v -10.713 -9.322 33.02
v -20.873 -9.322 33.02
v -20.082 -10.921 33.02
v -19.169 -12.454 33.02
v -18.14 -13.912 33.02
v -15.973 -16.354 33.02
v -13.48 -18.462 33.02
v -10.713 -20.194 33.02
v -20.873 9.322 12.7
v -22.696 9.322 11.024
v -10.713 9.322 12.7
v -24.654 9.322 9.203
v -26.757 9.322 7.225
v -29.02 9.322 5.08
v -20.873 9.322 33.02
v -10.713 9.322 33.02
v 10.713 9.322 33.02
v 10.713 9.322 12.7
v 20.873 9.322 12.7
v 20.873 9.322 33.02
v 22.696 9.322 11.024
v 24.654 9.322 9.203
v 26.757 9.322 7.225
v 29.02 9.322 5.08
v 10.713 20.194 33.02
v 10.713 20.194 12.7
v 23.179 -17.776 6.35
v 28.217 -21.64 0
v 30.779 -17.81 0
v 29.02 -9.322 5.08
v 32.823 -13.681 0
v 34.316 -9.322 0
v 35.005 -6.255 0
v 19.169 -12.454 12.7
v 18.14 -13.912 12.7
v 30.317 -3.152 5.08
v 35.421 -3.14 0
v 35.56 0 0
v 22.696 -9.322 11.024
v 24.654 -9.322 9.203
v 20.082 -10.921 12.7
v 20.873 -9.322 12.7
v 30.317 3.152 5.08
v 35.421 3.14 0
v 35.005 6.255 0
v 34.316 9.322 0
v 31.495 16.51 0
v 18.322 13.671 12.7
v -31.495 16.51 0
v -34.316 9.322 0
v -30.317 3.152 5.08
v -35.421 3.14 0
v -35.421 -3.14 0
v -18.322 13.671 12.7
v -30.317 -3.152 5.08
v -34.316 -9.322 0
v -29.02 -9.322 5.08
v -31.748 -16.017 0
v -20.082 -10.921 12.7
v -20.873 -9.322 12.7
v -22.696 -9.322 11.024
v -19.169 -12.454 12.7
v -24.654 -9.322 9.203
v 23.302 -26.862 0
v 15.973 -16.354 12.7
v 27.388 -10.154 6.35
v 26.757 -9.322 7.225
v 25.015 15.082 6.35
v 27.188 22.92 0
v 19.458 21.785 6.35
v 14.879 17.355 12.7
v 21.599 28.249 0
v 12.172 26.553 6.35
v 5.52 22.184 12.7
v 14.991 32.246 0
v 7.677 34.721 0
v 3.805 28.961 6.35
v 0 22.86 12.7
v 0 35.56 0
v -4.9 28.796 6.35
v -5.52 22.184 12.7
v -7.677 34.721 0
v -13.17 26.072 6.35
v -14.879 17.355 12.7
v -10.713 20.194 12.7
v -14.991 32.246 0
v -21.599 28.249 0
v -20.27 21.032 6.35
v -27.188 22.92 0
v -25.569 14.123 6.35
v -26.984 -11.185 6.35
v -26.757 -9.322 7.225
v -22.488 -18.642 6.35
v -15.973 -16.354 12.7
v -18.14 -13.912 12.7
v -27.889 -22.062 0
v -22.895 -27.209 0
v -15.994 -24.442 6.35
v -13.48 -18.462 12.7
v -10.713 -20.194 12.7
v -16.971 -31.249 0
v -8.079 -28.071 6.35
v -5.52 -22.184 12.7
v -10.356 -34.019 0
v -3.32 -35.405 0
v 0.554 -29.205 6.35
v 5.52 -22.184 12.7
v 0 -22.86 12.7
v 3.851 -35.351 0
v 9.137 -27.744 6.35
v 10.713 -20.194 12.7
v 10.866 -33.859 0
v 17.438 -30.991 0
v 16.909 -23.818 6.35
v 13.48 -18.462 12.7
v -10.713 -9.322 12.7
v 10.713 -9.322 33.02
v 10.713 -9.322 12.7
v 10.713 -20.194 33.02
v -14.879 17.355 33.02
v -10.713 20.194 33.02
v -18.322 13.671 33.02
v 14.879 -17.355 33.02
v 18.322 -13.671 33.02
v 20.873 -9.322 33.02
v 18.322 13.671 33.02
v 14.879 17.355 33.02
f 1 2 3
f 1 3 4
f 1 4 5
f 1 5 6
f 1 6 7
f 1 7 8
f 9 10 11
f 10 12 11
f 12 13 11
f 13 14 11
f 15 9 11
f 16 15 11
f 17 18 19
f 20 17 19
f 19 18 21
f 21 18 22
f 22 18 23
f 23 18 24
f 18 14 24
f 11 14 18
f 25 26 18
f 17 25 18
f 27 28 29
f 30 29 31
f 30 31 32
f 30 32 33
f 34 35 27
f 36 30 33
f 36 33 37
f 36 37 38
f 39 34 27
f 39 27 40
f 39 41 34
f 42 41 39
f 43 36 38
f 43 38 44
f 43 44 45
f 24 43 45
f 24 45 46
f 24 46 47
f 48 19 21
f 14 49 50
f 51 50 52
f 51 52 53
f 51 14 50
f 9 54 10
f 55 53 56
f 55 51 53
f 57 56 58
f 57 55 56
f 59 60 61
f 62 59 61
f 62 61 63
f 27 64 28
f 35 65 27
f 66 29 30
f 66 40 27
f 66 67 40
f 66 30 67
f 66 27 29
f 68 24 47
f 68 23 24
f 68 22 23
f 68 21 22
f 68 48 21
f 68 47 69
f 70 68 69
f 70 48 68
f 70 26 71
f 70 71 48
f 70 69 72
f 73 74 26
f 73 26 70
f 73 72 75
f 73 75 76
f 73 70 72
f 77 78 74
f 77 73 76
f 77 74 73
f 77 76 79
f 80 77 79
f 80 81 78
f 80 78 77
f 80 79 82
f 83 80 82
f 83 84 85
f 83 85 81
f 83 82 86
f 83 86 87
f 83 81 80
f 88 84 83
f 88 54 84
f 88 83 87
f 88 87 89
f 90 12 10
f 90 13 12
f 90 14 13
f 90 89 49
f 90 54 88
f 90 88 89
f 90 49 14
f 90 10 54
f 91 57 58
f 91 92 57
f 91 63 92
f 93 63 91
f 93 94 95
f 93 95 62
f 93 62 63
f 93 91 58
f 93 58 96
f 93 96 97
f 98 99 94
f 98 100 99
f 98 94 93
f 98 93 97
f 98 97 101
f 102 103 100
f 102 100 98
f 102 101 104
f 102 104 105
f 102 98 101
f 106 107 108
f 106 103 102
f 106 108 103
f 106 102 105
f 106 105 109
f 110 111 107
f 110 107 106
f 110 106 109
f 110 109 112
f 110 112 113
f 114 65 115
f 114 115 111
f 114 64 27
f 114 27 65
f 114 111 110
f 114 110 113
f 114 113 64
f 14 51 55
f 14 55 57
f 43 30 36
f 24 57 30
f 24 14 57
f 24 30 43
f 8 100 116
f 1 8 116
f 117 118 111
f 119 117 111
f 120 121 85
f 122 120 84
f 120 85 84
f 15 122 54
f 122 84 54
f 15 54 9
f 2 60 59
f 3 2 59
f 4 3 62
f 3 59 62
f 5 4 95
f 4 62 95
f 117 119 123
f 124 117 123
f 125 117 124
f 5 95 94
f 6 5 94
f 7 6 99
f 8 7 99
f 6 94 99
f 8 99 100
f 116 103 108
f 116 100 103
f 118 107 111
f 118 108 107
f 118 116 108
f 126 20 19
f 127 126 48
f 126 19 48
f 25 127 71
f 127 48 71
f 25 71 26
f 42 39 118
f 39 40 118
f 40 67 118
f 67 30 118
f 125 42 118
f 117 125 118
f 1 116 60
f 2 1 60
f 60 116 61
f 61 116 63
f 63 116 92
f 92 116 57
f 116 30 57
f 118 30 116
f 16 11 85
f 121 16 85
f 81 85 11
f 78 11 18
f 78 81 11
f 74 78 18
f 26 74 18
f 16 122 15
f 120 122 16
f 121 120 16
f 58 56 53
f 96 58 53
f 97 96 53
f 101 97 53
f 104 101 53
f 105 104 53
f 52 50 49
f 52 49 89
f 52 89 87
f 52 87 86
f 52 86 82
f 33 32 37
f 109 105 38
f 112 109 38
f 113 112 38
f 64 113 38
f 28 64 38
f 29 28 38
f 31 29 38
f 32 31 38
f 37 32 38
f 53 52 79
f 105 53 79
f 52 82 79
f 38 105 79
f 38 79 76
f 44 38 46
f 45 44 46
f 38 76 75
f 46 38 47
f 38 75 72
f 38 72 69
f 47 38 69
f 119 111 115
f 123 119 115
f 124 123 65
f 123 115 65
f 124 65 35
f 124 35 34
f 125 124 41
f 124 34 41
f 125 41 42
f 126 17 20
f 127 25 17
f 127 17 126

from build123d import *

# Parameters (mm, degrees)
F1_DEPTH    = 5.08
F2_SIZE     = 5.07999
F3_DEPTH    = 12.7
F4_DEPTH    = 12.7
F5_T2_ANGLE = 254.9699407606
F5_T4_ANGLE = 254.9699407606
F8_DEPTH    = 20.32
F9_DEPTH    = 20.32


# Not quite as in the source:
# - a fillet or chamfer that OpenCascade refuses, or shapes differently, is made with other operations: its cross-section is extruded or revolved along the edge and cut away or added
# - a fillet or chamfer is up to 0.001 mm smaller than in the source, because OpenCascade refuses the exact size


with BuildPart() as f1:
    # F0 (on Top) → F1 (new body)
    with BuildSketch(Plane.XY):
        with BuildLine():
            ThreePointArc((34.3164340333, -9.3218), (35.2477374751, -4.7021912858), (35.56, 0))
            ThreePointArc((35.56, 0), (35.2477374751, 4.7021912858), (34.3164340333, 9.3218))
            Line((34.3164340333, 9.3218), (-34.3164340333, 9.3218))
            ThreePointArc((-34.3164340333, 9.3218), (-35.56, 0), (-34.3164340333, -9.3218))
            Line((-34.3164340333, -9.3218), (34.3164340333, -9.3218))
        make_face()
    extrude(amount=F1_DEPTH)

    # F2 (size 5.08 in the source; OpenCascade refuses exactly that, so slightly less here)
    f2_edges = [f1.edges().sort_by_distance(p)[0] for p in [
        (35.56, 0, 5.08),
        (-35.56, 0, 5.08),
    ]]
    chamfer(f2_edges, length=F2_SIZE)

    # F0 (on Top) → F3 (join)
    with BuildSketch(Plane.XY):
        with BuildLine():
            ThreePointArc((-34.3164340333, -9.3218), (0, -35.56), (34.3164340333, -9.3218))
            Line((34.3164340333, -9.3218), (-34.3164340333, -9.3218))
        make_face()
    extrude(amount=F3_DEPTH)

    # F0 (on Top) → F4 (join)
    with BuildSketch(Plane.XY):
        with BuildLine():
            Line((-34.3164340333, 9.3218), (34.3164340333, 9.3218))
            ThreePointArc((34.3164340333, 9.3218), (0, 35.56), (-34.3164340333, 9.3218))
        make_face()
    extrude(amount=F4_DEPTH)

    # F5: chamfer of 12.7 on 2 edges, made by hand

    # F5_s1 → F5_t2 (revolve, cut)
    with BuildSketch(Plane(origin=(0, 0, 0), x_dir=(0, 0, 1), z_dir=(-0.6085532985, -0.7935130011, 0))):
        Polygon((0, -35.56), (12.7, -22.86), (12.7, -35.56), align=None)
    revolve(axis=Axis((0, 0, 12.7), (0, 0, 1)), revolution_arc=F5_T2_ANGLE, mode=Mode.SUBTRACT)

    # F5_s3 → F5_t4 (revolve, cut)
    with BuildSketch(Plane(origin=(0, 0, 0), x_dir=(0, 0, 1), z_dir=(0.6085532985, 0.7935130011, 0))):
        Polygon((0, -35.56), (12.7, -22.86), (12.7, -35.56), align=None)
    revolve(axis=Axis((0, 0, 12.7), (0, 0, 1)), revolution_arc=F5_T4_ANGLE, mode=Mode.SUBTRACT)

    # F6 (on face) → F8 (join)
    with BuildSketch(Plane.XY.offset(12.7)):
        with BuildLine():
            Line((-10.7130363091, -20.1943173452), (-10.7130363091, -9.3218))
            Line((-10.7130363091, -9.3218), (-20.8730363091, -9.3218))
            ThreePointArc((-20.8730363091, -9.3218), (-19.6408996947, -11.6967798638), (-18.1397072045, -13.911528404))
            ThreePointArc((-18.1397072045, -13.911528404), (-14.7644356914, -17.4525367416), (-10.7130363091, -20.1943173452))
        make_face()
        with BuildLine():
            ThreePointArc((10.7130363091, -20.1943173452), (16.7024819777, -15.6079049134), (20.8730363091, -9.3218))
            Line((20.8730363091, -9.3218), (10.7130363091, -9.3218))
            Line((10.7130363091, -9.3218), (10.7130363091, -20.1943173452))
        make_face()
    extrude(amount=F8_DEPTH)

    # F7 (on face) → F9 (join)
    with BuildSketch(Plane.XY.offset(12.7)):
        with BuildLine():
            Line((10.7130363091, 9.3218), (20.8730363091, 9.3218))
            ThreePointArc((20.8730363091, 9.3218), (16.7024819777, 15.6079049134), (10.7130363091, 20.1943173452))
            Line((10.7130363091, 20.1943173452), (10.7130363091, 9.3218))
        make_face()
        with BuildLine():
            Line((-20.8730363091, 9.3218), (-10.7130363091, 9.3218))
            Line((-10.7130363091, 9.3218), (-10.7130363091, 20.1943173452))
            ThreePointArc((-10.7130363091, 20.1943173452), (-16.7024819777, 15.6079049134), (-20.8730363091, 9.3218))
        make_face()
    extrude(amount=F9_DEPTH)


solid = f1.part
